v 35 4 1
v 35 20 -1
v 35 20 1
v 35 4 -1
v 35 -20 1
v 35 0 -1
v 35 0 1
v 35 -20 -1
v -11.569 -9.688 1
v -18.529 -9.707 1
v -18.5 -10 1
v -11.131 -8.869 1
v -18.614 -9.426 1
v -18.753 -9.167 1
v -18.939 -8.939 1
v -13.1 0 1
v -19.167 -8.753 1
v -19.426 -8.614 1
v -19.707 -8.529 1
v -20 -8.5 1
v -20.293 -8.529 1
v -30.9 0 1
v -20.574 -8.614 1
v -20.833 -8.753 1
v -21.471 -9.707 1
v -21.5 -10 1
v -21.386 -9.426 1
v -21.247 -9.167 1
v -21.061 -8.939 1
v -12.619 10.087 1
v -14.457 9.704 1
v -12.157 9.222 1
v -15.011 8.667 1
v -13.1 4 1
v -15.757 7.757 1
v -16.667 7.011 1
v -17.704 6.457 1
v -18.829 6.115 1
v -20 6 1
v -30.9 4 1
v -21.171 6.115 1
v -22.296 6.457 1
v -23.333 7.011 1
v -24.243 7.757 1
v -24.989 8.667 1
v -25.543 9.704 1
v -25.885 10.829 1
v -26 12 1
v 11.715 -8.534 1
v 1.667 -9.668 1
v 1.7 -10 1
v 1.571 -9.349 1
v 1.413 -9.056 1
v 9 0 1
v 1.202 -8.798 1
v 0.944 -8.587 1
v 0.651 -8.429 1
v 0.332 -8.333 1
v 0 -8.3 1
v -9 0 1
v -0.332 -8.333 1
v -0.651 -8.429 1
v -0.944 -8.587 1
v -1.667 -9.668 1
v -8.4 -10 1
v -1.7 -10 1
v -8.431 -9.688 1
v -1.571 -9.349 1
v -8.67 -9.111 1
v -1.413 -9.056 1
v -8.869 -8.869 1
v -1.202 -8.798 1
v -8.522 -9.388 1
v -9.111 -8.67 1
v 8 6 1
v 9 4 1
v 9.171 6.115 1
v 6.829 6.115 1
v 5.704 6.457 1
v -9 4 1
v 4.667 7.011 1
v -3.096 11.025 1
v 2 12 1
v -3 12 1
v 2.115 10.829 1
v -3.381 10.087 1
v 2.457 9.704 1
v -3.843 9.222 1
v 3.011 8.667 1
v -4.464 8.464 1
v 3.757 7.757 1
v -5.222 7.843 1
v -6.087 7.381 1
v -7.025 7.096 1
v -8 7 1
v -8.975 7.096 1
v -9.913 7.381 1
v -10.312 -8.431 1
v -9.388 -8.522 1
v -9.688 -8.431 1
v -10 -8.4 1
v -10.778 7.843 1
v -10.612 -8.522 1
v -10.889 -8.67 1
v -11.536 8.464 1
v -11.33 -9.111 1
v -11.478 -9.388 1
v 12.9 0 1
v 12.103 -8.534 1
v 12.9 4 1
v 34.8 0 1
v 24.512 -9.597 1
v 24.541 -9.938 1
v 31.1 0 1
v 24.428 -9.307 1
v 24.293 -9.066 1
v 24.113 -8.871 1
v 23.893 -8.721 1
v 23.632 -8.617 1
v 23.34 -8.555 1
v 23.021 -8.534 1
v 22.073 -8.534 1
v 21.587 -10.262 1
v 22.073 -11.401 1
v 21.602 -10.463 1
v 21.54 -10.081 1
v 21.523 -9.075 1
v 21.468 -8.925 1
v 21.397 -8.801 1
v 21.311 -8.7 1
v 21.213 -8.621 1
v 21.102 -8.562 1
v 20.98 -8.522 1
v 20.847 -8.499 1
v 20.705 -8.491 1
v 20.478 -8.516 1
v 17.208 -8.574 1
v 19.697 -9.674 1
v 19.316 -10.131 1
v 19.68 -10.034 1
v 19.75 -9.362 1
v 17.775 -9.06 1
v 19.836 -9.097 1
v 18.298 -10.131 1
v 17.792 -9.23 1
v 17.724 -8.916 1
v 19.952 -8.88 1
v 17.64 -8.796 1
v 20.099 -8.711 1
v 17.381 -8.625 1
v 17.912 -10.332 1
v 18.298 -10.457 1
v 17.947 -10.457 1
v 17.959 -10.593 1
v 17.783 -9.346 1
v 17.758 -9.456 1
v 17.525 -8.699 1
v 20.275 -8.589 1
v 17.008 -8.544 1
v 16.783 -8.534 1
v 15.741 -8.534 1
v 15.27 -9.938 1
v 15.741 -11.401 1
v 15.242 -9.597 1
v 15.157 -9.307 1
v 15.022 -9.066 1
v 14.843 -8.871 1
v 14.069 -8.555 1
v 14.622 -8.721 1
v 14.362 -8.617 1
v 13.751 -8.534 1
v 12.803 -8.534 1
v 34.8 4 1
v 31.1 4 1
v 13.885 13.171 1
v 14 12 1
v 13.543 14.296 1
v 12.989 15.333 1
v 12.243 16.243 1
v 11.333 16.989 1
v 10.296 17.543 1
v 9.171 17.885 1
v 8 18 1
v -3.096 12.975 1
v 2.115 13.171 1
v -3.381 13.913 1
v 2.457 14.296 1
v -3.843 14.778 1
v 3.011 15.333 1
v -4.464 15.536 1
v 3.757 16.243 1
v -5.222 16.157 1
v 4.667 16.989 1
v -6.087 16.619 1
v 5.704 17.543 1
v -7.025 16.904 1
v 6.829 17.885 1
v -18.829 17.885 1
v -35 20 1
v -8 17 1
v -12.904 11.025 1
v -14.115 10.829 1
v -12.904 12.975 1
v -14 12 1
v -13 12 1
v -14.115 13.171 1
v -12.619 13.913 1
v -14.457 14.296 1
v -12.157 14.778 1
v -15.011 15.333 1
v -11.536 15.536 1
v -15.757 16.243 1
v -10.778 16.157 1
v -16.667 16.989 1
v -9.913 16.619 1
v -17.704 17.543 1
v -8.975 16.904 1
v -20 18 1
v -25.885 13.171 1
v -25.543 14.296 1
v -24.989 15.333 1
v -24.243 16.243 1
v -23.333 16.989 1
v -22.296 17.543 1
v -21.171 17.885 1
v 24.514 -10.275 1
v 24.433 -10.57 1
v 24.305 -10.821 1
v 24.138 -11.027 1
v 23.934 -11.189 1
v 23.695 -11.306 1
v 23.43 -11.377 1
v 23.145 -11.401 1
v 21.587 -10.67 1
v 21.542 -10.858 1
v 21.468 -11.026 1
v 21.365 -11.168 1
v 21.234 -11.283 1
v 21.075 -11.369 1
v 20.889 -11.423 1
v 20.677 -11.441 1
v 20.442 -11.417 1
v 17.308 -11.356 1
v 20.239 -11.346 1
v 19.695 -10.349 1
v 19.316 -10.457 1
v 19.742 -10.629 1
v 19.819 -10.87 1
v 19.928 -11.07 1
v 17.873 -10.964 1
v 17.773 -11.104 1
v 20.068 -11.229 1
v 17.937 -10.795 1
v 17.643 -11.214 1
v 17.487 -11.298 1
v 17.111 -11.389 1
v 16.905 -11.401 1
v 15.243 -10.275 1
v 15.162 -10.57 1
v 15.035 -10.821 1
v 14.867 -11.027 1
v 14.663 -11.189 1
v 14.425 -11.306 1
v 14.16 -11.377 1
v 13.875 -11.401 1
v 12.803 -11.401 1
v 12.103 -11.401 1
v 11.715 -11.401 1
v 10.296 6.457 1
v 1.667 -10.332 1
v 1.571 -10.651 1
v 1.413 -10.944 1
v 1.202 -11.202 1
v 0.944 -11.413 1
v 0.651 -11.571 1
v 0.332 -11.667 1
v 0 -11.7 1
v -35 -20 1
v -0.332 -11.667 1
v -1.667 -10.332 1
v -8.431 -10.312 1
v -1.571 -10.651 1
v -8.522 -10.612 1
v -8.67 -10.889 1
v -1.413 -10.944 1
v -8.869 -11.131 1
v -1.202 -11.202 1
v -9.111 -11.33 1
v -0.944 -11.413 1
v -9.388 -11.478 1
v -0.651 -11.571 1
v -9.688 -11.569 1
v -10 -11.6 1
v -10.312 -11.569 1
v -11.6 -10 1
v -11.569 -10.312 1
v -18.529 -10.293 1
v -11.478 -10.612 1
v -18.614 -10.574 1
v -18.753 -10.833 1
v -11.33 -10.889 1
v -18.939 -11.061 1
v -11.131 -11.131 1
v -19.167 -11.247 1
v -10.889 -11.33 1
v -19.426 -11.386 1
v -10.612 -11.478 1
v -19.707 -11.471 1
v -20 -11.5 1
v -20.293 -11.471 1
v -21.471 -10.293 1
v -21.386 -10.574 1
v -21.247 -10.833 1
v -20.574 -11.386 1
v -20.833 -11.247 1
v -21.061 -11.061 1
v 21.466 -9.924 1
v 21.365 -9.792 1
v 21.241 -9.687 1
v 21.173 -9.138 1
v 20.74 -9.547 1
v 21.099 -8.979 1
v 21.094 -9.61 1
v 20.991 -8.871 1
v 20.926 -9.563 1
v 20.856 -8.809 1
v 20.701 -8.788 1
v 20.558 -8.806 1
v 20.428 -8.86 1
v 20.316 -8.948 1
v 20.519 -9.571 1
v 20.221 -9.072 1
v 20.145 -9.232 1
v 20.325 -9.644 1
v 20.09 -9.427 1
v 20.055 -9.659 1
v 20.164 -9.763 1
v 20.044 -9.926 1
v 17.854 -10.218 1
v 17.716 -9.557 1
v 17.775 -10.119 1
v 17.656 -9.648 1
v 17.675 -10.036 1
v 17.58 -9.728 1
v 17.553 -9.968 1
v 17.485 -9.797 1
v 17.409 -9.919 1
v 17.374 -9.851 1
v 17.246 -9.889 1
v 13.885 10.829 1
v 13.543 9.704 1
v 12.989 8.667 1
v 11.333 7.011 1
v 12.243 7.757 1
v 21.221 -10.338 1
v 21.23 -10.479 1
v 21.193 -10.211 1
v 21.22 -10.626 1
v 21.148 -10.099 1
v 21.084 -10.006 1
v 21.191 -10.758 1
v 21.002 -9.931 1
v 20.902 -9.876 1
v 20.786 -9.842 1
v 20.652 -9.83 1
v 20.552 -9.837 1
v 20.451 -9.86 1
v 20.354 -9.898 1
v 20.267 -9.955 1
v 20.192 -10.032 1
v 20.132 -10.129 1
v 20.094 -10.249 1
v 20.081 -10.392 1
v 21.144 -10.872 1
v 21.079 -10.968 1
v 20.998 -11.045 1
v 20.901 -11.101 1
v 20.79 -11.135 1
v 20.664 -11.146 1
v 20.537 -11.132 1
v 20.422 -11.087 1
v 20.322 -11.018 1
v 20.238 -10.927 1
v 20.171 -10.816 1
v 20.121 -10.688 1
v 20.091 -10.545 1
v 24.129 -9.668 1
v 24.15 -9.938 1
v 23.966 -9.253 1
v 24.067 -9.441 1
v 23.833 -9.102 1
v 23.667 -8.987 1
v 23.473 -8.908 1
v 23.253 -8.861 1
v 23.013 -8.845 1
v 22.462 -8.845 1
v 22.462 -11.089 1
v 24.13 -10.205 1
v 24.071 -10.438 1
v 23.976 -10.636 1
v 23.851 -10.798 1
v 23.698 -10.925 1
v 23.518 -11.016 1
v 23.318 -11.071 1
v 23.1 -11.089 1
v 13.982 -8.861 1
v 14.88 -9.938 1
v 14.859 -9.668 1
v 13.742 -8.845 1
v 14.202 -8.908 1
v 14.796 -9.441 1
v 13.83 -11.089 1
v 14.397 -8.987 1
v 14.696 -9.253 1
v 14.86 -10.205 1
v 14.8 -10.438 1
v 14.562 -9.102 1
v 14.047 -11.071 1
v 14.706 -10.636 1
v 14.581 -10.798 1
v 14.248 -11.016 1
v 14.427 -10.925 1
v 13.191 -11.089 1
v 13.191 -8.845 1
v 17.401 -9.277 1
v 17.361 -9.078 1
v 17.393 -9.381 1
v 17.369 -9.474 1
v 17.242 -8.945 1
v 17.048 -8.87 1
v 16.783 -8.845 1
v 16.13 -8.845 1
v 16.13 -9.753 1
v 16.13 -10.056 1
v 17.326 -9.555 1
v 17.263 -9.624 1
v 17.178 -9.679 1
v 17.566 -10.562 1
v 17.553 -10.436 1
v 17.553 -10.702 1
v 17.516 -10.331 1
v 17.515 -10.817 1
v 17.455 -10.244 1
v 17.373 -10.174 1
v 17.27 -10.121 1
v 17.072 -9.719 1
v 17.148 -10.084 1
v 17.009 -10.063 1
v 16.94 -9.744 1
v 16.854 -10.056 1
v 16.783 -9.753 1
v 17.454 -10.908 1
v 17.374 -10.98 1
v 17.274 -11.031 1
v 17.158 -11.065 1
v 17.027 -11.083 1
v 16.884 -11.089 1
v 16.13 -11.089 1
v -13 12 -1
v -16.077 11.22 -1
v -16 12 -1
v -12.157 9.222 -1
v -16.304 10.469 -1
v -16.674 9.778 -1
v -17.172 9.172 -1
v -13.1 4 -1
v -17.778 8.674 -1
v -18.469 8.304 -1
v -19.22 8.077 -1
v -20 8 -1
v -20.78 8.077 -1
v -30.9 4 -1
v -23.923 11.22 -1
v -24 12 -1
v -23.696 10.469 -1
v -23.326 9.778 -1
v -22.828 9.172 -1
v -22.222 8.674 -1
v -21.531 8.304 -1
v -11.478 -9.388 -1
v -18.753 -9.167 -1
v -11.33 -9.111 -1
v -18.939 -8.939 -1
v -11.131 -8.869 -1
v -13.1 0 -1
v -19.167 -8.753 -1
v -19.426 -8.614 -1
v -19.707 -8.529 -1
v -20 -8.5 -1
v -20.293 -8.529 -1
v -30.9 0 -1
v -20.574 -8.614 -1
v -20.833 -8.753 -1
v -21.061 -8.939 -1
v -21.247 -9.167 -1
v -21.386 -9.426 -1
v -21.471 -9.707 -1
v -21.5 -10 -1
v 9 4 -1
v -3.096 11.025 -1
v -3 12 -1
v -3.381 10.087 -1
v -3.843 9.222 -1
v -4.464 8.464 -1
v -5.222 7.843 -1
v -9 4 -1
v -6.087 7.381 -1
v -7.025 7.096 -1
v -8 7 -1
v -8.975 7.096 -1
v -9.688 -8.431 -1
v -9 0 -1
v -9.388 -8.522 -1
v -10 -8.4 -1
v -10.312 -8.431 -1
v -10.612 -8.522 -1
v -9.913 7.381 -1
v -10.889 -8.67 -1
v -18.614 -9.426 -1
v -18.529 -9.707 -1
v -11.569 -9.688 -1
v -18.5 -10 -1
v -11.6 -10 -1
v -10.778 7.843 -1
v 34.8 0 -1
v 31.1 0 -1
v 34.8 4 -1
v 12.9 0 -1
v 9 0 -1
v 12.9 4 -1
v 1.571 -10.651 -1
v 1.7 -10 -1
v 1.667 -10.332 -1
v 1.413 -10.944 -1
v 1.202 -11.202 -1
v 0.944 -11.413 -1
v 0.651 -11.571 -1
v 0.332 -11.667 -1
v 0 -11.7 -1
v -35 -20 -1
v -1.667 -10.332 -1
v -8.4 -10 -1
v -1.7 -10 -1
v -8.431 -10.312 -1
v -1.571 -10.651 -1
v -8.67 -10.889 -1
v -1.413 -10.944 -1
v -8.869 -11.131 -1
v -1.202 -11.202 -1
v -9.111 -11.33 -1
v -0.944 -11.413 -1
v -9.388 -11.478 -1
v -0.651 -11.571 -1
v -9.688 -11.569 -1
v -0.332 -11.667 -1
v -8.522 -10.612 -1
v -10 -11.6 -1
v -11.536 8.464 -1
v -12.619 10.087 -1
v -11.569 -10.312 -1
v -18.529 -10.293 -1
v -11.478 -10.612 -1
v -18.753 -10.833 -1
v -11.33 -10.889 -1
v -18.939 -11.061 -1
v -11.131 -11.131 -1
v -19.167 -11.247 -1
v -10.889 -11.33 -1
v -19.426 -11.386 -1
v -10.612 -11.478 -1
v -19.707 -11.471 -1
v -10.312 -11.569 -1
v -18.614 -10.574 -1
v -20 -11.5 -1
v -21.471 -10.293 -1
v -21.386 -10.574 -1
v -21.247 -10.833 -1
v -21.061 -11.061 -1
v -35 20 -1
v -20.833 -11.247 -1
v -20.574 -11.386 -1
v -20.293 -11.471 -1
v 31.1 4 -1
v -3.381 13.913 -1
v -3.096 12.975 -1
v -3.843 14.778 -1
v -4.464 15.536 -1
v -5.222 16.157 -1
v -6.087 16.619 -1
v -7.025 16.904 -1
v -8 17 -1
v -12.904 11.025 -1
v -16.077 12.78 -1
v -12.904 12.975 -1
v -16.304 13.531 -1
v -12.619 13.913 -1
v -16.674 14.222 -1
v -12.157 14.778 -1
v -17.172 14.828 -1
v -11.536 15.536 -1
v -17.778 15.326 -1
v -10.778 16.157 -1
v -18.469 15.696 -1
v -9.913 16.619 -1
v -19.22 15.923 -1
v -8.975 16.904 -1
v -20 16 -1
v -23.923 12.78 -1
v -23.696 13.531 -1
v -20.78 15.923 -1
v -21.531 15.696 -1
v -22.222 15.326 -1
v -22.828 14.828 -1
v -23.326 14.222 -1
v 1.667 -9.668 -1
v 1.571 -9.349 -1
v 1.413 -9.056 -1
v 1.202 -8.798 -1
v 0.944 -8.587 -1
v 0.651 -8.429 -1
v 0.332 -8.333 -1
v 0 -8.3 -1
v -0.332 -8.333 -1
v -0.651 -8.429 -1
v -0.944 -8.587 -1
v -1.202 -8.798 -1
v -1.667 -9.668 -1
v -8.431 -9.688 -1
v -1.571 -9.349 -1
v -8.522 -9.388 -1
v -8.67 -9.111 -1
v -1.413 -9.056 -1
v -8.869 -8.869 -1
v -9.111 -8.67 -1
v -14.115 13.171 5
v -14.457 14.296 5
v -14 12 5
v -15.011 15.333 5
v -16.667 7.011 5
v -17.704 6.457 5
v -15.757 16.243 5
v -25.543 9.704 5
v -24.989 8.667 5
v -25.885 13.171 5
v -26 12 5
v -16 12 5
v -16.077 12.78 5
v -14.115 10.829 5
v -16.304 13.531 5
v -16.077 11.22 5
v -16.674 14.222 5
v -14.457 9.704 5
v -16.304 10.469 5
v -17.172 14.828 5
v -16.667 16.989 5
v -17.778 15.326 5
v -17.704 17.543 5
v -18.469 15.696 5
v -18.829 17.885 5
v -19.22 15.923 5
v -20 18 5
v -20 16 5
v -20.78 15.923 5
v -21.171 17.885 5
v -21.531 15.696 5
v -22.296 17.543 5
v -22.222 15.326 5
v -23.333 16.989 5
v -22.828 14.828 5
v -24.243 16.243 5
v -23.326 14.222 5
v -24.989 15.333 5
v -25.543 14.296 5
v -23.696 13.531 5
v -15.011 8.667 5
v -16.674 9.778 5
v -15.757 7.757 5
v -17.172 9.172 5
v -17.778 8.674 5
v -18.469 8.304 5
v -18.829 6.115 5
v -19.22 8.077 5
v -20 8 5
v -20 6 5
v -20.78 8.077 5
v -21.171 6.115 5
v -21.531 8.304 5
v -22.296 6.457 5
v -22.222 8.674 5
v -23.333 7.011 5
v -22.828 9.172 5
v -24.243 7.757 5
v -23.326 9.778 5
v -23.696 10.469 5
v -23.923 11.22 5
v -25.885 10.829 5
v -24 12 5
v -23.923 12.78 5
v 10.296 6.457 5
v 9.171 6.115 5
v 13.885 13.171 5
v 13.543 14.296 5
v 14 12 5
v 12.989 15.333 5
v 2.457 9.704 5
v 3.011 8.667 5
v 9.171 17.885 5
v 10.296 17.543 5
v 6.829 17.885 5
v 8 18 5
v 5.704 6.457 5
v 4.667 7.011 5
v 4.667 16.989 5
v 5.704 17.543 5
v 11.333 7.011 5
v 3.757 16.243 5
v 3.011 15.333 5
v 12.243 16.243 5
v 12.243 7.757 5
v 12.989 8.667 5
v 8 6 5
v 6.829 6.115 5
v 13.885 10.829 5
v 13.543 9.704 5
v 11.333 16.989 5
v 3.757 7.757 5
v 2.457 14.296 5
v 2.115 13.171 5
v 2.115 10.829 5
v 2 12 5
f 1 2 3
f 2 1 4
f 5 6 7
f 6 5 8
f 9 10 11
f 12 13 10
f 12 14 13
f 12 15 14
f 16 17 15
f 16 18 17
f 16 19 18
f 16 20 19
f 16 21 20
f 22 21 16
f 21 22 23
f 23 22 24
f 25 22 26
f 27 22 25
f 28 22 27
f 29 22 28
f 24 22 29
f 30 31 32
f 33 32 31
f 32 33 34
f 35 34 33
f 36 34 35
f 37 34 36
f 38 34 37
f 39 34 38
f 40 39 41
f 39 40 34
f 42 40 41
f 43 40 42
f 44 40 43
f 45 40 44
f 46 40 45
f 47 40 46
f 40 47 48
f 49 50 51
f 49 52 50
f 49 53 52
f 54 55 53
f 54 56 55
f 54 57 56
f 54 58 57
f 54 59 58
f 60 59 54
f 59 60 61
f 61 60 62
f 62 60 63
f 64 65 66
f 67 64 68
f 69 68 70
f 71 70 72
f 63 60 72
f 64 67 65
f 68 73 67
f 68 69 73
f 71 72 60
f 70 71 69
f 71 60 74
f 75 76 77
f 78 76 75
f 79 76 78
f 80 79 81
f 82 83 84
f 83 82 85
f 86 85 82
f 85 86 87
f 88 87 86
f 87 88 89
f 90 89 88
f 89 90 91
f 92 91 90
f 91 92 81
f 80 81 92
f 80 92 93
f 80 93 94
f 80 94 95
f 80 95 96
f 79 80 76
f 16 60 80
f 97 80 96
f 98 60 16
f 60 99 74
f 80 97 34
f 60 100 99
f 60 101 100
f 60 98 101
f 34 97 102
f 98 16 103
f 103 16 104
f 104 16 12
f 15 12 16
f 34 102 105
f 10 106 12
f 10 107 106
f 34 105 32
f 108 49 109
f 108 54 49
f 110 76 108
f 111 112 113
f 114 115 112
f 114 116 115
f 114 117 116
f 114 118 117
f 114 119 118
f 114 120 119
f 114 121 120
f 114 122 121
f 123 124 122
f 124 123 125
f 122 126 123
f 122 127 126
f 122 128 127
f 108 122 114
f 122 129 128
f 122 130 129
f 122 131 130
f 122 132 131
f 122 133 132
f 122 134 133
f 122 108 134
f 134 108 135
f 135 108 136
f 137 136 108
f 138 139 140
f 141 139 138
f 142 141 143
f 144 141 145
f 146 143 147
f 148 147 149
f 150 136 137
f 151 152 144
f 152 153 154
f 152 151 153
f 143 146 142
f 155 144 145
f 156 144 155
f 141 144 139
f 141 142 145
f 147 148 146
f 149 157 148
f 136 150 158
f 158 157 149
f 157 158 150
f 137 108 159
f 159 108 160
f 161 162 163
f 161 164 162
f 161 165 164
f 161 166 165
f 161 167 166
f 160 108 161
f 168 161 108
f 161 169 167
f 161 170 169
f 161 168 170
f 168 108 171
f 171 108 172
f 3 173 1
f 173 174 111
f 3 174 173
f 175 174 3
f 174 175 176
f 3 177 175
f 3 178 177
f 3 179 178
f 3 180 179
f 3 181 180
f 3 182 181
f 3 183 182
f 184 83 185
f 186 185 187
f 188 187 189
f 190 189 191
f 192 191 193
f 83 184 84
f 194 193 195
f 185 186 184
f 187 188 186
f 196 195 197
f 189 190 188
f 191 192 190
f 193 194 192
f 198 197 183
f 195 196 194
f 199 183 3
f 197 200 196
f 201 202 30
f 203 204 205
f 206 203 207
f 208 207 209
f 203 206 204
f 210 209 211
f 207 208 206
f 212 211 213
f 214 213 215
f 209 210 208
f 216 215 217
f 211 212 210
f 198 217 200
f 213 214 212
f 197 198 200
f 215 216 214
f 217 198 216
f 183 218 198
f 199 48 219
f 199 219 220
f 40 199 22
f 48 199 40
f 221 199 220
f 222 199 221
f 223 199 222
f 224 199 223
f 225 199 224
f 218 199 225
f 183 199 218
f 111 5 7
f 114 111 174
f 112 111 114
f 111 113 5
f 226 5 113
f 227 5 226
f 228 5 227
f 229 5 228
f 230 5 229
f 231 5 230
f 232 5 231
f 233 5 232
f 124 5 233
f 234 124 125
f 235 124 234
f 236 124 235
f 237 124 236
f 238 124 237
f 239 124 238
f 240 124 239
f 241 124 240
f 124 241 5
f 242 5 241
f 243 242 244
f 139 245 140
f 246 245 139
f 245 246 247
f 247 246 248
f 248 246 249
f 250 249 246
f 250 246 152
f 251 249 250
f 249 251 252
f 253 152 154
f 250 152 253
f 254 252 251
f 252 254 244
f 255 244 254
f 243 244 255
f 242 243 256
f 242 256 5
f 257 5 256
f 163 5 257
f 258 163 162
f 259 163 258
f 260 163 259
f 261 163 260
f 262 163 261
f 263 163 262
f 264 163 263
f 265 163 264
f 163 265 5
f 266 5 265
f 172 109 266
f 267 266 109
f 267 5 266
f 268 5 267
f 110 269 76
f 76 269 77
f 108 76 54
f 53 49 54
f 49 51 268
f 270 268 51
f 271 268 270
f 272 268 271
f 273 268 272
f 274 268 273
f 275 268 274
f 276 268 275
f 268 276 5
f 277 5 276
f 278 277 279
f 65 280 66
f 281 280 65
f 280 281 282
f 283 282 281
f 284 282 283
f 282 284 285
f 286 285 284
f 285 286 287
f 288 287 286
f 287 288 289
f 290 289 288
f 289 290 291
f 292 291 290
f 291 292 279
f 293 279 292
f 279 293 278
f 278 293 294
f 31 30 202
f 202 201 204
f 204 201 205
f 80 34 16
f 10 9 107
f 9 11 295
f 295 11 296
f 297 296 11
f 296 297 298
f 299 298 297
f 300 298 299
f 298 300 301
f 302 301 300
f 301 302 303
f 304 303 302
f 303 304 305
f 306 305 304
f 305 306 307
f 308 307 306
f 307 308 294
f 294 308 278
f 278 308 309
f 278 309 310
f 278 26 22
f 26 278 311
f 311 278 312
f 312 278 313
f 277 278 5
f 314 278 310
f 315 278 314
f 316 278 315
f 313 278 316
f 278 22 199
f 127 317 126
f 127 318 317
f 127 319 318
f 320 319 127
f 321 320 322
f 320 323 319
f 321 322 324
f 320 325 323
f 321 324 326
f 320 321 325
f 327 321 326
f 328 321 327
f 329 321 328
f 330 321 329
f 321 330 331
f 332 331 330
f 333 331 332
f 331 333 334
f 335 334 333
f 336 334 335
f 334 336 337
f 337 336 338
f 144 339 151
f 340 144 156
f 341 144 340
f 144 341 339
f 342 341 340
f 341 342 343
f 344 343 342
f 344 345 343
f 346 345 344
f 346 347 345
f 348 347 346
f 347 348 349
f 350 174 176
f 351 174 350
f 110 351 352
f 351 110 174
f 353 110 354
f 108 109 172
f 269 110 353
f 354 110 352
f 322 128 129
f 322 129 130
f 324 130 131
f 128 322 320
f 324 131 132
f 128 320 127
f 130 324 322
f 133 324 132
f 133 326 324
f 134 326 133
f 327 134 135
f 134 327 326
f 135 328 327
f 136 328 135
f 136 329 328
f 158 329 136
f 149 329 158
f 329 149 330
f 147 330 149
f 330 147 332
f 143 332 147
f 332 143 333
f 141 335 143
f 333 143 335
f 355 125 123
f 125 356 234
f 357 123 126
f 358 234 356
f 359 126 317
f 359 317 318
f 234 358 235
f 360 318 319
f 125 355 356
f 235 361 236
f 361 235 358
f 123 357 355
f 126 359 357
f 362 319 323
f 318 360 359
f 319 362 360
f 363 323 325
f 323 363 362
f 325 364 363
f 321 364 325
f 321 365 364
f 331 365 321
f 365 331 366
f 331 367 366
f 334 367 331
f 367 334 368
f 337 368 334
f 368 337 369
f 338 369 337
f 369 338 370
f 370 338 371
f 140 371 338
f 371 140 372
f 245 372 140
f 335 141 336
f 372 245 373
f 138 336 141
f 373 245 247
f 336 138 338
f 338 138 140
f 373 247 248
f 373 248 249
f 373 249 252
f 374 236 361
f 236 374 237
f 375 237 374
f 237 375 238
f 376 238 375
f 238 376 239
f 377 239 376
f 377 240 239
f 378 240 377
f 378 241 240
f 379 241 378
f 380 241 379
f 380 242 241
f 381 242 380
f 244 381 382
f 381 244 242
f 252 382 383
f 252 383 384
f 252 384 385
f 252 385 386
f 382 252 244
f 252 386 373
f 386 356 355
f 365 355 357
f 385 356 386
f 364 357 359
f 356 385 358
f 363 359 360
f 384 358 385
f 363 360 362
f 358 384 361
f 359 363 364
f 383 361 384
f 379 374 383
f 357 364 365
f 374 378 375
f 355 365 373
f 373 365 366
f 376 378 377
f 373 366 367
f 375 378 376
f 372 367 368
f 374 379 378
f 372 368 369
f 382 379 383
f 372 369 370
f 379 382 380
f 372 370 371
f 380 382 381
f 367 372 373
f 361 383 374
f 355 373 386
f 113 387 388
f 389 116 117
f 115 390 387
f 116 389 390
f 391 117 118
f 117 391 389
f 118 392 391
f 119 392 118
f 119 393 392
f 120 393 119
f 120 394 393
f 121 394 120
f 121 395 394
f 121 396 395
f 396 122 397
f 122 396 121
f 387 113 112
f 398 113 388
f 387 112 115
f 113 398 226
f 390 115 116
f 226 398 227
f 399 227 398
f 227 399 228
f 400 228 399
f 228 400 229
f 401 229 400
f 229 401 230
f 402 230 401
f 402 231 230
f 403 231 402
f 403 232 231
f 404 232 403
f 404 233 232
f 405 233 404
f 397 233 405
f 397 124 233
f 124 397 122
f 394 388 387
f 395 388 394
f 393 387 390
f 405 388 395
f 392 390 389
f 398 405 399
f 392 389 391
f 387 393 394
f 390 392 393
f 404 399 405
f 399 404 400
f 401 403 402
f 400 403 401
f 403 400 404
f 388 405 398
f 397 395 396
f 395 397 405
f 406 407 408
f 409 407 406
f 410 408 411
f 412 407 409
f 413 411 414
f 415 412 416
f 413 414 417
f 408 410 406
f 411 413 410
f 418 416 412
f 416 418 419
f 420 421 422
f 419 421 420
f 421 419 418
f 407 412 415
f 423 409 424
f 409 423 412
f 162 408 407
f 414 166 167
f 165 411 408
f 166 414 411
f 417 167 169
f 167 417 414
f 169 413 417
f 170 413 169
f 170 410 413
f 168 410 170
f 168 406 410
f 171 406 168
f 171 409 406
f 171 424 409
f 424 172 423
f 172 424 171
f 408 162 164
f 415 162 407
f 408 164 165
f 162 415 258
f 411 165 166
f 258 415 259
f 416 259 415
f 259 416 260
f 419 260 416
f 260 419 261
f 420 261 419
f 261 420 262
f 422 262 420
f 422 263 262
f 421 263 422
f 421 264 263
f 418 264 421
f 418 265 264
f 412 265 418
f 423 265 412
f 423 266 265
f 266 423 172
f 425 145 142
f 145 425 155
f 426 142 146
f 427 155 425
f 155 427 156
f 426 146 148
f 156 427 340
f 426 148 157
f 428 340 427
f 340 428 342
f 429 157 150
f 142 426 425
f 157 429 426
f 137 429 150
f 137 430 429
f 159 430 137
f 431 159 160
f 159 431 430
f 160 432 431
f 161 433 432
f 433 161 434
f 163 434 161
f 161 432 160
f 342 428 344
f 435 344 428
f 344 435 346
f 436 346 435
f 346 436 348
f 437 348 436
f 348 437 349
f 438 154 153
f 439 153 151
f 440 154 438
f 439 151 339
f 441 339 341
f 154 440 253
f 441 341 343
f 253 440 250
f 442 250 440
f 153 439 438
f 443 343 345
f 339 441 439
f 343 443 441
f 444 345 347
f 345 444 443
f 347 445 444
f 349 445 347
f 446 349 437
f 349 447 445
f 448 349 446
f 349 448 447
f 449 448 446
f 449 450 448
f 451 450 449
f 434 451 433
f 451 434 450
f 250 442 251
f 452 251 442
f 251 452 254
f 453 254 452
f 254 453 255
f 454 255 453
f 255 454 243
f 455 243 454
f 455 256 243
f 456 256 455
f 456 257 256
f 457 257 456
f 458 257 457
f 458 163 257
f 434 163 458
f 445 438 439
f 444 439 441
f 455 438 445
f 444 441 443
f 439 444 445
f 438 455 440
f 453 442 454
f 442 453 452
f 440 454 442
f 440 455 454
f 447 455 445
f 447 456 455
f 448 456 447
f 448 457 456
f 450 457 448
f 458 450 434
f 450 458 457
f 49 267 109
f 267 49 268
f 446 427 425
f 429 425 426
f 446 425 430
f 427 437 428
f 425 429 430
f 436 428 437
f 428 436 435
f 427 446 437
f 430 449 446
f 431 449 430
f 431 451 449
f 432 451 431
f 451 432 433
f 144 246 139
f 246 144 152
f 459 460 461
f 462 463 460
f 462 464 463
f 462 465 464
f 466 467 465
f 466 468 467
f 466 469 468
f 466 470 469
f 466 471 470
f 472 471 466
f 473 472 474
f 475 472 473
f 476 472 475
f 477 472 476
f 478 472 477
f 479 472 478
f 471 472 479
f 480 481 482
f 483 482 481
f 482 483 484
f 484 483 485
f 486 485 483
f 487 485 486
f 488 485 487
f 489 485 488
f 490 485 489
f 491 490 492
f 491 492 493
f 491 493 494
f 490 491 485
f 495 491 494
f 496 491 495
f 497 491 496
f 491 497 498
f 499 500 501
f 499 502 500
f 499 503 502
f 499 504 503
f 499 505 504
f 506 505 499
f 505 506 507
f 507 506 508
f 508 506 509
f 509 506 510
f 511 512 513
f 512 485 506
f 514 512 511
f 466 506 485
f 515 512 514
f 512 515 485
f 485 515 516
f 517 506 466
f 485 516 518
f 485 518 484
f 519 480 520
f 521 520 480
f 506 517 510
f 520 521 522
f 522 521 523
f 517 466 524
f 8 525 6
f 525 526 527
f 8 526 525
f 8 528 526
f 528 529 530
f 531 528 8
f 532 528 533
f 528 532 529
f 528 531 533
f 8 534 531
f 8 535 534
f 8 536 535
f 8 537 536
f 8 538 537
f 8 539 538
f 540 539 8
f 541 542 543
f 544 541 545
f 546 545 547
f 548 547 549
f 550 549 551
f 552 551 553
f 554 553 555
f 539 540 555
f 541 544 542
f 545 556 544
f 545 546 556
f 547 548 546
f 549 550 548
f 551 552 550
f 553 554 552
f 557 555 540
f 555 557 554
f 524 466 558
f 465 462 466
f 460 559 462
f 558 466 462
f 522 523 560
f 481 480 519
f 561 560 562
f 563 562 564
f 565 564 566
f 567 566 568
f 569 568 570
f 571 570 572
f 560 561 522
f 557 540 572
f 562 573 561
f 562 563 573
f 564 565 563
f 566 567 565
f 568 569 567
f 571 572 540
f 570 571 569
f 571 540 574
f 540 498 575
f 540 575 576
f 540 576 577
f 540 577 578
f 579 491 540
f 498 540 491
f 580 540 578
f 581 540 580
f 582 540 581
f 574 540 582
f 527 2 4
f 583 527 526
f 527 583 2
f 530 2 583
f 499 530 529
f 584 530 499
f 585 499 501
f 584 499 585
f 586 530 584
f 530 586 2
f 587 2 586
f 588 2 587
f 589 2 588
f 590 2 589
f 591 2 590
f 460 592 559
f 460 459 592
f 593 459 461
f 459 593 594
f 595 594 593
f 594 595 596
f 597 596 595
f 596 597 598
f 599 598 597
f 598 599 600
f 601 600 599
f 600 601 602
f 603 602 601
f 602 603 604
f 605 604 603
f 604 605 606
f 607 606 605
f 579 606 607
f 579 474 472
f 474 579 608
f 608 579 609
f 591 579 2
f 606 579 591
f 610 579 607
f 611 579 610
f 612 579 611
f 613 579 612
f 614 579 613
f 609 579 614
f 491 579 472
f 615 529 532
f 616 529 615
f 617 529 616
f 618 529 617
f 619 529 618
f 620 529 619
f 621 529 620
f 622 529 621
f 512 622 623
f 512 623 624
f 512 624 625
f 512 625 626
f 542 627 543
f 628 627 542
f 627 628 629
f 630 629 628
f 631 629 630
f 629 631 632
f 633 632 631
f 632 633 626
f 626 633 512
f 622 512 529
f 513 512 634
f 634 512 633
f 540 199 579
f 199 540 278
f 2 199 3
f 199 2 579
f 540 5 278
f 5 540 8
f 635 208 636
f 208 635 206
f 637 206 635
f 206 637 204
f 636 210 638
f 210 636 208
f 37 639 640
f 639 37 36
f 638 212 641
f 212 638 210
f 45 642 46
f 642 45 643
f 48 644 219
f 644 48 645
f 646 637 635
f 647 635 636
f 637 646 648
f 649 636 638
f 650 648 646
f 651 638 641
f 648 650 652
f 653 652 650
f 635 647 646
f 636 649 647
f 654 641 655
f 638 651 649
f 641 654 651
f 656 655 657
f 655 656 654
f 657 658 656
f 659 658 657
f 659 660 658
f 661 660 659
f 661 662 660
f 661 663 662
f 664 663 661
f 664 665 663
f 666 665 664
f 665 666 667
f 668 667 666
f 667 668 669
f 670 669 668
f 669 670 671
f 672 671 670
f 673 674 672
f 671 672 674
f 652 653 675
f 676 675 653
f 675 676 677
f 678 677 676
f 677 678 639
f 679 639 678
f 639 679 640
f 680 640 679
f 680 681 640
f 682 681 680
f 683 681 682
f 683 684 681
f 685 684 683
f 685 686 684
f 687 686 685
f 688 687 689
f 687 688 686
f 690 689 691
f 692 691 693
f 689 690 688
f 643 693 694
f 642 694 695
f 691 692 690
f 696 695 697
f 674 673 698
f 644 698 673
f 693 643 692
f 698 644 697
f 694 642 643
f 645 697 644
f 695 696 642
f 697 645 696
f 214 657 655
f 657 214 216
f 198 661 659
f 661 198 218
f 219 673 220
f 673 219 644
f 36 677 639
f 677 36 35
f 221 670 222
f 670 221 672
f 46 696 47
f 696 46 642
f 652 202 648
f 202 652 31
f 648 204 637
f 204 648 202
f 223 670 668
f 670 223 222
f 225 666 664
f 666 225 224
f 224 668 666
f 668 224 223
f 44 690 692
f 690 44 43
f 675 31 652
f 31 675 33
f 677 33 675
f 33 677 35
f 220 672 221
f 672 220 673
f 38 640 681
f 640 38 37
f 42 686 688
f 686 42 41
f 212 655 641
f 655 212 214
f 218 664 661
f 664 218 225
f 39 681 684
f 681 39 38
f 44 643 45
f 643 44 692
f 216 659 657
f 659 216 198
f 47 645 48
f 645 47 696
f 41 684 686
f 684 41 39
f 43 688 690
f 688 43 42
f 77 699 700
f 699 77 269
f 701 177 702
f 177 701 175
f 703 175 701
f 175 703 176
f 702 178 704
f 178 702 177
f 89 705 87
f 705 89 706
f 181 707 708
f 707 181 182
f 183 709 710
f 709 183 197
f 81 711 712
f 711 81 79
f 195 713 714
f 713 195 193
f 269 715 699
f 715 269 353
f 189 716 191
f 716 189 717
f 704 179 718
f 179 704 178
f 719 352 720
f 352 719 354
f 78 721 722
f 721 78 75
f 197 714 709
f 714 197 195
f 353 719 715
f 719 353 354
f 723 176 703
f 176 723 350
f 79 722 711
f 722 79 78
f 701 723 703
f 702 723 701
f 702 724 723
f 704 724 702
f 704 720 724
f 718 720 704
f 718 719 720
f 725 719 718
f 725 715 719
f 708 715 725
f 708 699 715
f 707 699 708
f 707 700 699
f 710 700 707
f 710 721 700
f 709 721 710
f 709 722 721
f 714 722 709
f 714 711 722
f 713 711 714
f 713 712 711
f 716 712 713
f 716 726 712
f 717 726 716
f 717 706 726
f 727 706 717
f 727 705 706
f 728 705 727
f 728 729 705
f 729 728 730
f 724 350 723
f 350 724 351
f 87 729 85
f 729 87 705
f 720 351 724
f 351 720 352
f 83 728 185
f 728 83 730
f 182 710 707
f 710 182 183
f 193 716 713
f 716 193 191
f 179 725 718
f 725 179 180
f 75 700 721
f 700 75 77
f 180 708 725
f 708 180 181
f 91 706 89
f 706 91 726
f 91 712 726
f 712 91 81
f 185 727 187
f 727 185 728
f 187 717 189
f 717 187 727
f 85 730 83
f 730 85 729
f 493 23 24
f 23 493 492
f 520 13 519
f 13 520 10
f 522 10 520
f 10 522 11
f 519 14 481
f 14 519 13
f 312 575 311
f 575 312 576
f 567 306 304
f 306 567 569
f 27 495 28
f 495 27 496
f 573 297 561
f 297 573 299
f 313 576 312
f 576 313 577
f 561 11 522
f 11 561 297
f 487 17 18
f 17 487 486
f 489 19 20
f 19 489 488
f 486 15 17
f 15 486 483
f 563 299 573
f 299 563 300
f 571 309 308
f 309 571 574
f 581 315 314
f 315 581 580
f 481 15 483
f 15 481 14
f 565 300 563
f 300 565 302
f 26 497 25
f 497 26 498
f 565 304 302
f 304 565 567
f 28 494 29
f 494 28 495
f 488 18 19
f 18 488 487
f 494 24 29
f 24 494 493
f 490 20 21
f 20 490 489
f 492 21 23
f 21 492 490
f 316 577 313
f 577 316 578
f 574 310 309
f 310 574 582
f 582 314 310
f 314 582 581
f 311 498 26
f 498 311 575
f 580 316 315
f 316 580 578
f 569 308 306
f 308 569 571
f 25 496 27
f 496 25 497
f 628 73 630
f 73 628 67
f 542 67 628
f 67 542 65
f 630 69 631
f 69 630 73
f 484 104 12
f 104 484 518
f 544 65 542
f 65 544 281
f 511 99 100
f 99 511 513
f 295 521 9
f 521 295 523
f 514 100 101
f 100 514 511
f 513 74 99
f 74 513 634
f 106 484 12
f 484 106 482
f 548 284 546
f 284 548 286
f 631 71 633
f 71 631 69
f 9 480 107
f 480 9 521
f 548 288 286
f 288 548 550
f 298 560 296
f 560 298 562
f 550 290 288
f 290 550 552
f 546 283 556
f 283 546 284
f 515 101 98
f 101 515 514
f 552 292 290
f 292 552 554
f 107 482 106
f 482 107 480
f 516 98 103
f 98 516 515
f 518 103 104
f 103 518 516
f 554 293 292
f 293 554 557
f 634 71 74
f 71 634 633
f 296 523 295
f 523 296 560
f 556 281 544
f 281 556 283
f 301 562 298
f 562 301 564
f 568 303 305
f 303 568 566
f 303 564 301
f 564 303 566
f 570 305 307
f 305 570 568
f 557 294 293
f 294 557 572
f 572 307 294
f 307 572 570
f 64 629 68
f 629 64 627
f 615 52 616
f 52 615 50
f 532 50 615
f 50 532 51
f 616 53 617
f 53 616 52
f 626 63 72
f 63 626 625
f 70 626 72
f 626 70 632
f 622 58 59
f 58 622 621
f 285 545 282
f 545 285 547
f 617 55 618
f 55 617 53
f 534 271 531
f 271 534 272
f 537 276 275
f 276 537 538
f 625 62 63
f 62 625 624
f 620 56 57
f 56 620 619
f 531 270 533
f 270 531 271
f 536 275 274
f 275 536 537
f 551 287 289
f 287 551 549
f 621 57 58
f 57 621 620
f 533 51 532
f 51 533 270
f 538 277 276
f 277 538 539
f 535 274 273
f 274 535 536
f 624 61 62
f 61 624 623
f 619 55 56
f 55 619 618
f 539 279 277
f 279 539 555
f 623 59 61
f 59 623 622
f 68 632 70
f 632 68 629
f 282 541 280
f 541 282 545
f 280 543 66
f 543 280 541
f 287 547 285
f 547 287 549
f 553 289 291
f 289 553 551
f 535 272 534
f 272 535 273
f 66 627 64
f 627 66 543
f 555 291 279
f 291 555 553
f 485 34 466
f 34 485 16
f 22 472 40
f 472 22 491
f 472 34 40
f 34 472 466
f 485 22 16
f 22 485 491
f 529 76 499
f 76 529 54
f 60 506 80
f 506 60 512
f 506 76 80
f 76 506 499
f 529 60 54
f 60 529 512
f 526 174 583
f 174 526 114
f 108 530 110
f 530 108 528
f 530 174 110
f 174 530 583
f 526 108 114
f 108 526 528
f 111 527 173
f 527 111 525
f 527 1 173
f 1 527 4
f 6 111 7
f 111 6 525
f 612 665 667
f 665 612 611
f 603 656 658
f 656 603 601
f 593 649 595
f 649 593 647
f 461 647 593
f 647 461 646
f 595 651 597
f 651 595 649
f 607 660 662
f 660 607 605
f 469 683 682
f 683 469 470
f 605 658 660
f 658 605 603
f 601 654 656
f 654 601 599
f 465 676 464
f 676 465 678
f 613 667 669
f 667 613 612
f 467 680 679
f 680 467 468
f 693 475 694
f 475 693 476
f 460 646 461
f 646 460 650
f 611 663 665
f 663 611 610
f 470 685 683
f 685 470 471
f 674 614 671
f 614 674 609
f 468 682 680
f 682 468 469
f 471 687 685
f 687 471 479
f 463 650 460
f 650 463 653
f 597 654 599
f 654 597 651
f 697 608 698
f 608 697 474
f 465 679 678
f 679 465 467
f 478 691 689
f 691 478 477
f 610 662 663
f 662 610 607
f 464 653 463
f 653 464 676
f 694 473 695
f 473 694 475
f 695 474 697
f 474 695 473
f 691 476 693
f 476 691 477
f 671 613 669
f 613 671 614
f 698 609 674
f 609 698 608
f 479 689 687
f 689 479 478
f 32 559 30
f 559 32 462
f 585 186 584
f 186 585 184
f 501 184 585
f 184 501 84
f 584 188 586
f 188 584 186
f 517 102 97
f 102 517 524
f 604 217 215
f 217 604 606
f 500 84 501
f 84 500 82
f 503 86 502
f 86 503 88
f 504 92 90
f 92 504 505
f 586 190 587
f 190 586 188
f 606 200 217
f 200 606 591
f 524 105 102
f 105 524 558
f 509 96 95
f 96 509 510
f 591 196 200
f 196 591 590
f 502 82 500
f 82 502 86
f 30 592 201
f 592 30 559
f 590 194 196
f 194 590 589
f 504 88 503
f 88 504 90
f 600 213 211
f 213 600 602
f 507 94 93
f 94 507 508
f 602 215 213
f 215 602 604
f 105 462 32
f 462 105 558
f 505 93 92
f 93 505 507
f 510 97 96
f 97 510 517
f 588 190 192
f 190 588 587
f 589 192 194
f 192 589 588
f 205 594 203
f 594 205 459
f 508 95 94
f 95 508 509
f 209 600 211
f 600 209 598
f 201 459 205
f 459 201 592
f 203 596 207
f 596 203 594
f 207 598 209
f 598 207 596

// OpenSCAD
// IDB-6D Fit-Test Coupon
// Generated by DIY Lamp Builder
// Print this coupon before the full shell to validate M3 holes, diffuser slot, cable exit, and engraving.

font = "Liberation Sans"; // font() may not render on all OpenSCAD builds; use for reference only

module m3_hole_ladder() {
  // M3 hole diameter test: 3.0 / 3.2 / 3.4 mm
  for (i = [0:2]) {
    d = 3.0 + i * 0.2;
    translate([i * 10, 0, 0])
      cylinder(d = d, h = 10, center = true, $fn = 32);
  }
}

module diffuser_slot_ladder() {
  // Diffuser slot width test: 17.8 / 18.0 / 18.2 / 18.4 mm
  widths = [17.8, 18.0, 18.2, 18.4];
  for (i = [0:3]) {
    translate([i * 22, 0, 0])
      cube([widths[i], 4, 8], center = true);
  }
}

module cable_exit_test() {
  // Cable exit radius test: 4 / 5 mm
  for (i = [0:1]) {
    r = 4 + i;
    translate([i * 12, 0, 0])
      cylinder(r = r, h = 10, center = true, $fn = 32);
  }
}

module engraving_sample() {
  // Small text sample to check legibility after FDM
  linear_extrude(height = 0.3)
    text("IDB-6D", size = 3, font = font, halign = "center", valign = "center");
}

module fit_test_coupon() {
  difference() {
    union() {
      // base plate
      cube([70, 40, 2], center = true);
      // cable exit bosses
      translate([-20, 12, 3]) cylinder(r = 6, h = 4, center = true, $fn = 32);
      translate([8, 12, 3]) cylinder(r = 6, h = 4, center = true, $fn = 32);
    }
    // M3 holes
    translate([-20, -10, 0]) m3_hole_ladder();
    // diffuser slots
    translate([-22, 2, 0]) diffuser_slot_ladder();
    // cable exits
    translate([-20, 12, 3]) cable_exit_test();
    // engraving
    translate([18, -10, 1]) engraving_sample();
  }
}

fit_test_coupon();
